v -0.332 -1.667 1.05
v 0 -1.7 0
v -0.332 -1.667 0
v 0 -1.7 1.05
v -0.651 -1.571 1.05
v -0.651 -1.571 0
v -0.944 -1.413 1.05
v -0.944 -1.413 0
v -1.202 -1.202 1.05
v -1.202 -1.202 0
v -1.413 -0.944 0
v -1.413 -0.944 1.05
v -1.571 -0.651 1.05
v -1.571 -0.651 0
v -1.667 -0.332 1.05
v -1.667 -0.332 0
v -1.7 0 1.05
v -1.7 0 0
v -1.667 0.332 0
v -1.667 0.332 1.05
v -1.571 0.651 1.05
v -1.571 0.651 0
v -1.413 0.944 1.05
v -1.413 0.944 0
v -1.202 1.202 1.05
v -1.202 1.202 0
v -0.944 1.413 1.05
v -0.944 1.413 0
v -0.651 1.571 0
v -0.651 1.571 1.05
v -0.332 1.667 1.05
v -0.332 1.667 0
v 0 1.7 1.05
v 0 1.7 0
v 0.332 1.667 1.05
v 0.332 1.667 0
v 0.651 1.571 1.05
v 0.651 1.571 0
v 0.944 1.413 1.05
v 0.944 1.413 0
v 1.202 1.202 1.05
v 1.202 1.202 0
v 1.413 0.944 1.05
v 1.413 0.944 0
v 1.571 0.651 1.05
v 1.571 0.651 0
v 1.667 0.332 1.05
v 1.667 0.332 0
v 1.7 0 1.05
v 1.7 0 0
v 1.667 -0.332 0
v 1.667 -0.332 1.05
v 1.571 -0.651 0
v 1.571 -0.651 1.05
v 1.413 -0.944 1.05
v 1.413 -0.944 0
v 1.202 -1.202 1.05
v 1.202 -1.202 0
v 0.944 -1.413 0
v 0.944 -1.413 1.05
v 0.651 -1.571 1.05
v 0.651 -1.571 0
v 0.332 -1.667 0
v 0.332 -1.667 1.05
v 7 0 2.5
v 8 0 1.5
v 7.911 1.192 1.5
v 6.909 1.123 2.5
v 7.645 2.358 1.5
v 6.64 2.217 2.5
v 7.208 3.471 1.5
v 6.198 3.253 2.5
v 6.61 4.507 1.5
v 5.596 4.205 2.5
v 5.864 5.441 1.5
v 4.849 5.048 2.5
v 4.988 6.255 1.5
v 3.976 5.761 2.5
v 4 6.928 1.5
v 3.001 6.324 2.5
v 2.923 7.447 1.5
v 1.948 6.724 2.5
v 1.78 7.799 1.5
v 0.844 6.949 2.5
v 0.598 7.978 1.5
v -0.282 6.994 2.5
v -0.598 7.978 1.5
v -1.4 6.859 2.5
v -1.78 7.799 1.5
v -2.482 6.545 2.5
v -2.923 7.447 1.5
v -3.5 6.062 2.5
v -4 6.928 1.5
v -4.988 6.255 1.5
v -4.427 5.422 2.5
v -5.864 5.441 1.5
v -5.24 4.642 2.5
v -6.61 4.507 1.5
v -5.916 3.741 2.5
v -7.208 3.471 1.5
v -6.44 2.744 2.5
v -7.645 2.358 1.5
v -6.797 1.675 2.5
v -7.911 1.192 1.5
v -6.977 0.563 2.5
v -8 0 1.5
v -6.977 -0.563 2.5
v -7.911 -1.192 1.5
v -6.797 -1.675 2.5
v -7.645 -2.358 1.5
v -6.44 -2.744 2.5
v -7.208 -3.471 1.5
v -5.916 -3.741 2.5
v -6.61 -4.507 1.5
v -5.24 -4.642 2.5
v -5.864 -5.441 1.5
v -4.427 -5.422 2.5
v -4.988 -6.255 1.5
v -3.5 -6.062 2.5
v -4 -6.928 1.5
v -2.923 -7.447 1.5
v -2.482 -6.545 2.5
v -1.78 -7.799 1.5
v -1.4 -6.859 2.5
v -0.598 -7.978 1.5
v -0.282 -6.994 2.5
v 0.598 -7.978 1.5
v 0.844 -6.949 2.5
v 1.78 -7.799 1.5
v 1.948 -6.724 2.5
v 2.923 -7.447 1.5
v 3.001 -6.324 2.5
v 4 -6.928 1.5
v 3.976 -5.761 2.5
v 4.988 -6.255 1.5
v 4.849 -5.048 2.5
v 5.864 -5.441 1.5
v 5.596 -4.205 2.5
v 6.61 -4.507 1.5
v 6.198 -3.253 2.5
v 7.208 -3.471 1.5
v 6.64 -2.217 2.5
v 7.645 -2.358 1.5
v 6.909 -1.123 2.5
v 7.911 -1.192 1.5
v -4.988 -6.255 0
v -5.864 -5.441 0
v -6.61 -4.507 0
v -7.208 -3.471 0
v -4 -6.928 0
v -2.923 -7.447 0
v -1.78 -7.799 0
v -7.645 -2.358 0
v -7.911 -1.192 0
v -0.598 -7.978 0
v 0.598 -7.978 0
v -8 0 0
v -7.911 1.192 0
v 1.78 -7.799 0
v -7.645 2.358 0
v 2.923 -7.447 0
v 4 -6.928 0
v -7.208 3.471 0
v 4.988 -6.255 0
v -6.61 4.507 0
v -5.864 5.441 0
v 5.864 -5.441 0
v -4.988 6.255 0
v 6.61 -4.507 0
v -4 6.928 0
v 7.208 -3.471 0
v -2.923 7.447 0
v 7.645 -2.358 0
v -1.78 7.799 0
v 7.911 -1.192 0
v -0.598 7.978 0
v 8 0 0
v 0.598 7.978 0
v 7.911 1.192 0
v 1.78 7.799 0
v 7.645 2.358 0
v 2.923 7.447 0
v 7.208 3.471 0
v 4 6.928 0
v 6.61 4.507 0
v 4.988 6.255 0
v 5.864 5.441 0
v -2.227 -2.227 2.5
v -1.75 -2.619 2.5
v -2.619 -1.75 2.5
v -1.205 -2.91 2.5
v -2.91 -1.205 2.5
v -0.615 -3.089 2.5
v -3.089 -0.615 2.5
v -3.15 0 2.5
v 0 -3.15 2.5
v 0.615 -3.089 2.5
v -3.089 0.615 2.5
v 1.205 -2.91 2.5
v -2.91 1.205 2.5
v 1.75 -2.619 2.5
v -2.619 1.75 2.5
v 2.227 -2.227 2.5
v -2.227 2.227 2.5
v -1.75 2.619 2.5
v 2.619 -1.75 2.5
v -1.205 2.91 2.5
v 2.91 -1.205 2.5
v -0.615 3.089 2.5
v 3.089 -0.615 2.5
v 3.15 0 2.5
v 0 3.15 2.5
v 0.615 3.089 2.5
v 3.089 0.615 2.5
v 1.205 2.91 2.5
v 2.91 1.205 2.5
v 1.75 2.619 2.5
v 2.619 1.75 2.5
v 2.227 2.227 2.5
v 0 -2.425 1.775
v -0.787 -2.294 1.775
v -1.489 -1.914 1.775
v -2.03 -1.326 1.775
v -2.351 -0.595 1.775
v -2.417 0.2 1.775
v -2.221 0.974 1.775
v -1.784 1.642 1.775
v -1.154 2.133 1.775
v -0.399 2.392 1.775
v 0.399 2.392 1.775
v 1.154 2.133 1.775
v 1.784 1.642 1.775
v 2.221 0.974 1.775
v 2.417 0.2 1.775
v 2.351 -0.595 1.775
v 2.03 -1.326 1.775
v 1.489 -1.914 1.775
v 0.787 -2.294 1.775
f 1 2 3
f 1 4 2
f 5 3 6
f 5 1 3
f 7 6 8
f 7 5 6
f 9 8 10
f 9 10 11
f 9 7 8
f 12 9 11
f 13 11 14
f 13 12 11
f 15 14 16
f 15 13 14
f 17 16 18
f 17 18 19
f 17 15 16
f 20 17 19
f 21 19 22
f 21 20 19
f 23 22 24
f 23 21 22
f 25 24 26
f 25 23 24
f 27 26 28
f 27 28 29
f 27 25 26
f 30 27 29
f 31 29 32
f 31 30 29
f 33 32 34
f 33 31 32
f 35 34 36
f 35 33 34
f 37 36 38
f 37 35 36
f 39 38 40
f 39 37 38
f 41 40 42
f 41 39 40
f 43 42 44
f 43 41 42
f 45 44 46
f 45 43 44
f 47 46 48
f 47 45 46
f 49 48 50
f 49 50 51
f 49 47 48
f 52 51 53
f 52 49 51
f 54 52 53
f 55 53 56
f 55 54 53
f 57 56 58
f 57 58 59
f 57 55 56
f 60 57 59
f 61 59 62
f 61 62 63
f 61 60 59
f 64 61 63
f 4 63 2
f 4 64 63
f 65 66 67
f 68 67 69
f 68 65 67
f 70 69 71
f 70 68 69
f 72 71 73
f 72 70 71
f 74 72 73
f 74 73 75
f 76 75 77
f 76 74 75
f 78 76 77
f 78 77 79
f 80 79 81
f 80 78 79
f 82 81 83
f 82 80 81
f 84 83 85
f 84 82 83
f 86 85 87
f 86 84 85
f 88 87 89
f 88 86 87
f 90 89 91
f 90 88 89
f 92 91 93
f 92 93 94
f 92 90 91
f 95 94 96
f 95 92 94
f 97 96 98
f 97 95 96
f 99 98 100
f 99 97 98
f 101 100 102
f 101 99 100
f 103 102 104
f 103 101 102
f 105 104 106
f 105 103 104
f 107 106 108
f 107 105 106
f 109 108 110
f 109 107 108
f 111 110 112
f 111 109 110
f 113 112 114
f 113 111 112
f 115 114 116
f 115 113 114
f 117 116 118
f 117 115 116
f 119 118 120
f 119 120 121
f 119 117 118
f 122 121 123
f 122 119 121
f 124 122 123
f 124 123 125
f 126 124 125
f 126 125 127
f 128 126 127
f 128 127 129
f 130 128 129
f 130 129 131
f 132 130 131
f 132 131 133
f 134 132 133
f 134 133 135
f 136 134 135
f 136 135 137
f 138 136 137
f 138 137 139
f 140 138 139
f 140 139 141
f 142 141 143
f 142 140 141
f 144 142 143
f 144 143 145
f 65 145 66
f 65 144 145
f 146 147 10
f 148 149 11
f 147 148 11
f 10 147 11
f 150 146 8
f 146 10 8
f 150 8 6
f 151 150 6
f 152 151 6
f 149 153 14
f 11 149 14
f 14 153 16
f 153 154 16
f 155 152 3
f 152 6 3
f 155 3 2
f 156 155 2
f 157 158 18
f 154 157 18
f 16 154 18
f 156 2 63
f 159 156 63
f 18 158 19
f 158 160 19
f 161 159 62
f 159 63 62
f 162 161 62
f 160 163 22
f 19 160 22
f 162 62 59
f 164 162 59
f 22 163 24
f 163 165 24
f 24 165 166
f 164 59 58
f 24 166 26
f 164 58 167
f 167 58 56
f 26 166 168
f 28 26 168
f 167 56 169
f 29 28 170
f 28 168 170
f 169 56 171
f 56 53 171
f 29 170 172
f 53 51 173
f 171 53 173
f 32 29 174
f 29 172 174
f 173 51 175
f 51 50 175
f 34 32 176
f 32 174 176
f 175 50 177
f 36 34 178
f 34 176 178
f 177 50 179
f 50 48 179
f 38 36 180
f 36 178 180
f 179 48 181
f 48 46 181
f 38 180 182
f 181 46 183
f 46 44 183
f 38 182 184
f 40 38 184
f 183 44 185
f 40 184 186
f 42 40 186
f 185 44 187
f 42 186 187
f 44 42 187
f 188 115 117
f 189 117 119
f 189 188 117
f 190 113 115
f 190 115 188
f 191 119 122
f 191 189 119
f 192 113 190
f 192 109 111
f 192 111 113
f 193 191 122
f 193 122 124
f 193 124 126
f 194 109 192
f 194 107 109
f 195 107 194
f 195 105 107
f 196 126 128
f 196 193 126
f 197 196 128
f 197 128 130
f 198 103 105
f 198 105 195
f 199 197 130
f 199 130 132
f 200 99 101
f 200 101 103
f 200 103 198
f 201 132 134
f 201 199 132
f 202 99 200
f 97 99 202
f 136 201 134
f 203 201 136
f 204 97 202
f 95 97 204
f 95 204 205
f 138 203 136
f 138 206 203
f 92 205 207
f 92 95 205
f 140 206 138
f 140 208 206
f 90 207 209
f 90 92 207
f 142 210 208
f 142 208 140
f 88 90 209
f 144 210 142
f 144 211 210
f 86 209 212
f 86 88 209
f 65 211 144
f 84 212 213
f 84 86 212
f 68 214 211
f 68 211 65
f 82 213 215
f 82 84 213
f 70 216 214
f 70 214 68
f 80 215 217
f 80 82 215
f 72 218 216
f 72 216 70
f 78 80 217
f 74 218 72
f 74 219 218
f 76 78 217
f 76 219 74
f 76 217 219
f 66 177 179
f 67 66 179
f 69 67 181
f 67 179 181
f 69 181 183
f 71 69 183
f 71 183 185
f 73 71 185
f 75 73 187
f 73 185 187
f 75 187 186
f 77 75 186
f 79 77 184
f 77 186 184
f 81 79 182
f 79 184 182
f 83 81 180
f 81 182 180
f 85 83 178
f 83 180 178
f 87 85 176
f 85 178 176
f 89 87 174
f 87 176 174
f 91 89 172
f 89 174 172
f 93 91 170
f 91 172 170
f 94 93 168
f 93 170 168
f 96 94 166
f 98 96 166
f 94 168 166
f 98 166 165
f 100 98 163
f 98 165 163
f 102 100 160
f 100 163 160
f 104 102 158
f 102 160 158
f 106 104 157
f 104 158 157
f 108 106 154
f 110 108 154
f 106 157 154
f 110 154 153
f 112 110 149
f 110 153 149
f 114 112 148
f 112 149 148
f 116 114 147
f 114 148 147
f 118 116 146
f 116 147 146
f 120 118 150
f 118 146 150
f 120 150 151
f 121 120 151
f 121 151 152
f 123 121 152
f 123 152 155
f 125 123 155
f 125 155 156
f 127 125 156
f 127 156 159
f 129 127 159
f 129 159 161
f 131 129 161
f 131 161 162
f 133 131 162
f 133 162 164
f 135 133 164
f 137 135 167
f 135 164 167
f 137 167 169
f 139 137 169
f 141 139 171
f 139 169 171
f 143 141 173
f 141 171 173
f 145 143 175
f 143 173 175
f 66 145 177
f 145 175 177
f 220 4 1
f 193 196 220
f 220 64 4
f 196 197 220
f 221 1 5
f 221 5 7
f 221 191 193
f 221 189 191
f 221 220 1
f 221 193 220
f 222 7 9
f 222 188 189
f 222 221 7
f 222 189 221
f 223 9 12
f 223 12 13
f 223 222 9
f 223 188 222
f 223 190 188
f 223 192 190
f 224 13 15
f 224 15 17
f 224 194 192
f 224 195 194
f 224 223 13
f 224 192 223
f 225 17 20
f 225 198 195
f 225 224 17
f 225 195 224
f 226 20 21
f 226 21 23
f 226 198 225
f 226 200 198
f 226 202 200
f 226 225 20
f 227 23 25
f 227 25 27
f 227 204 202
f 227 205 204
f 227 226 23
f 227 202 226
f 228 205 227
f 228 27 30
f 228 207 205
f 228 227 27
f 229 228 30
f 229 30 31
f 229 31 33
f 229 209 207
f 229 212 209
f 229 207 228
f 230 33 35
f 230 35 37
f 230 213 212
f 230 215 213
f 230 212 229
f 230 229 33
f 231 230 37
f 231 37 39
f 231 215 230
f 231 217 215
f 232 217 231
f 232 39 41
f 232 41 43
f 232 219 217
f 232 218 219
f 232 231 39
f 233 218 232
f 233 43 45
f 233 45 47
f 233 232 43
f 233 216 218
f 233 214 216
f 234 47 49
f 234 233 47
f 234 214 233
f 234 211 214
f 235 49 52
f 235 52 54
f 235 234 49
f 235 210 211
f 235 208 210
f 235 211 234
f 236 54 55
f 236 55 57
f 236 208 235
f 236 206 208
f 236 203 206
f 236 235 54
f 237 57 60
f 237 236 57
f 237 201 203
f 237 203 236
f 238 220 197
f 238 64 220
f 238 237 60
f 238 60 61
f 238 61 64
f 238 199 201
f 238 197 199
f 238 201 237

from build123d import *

# Parameters (mm, degrees)
SKETCH_1_R      = 8
EXTRUDE_1_DEPTH = 2.5
CHAMFER_1_SIZE  = 1


with BuildPart() as part:
    # Эскиз1 → Бобышка-Вытянуть1 (new body)
    with BuildSketch(Plane.XY):
        Circle(SKETCH_1_R)
    extrude(amount=EXTRUDE_1_DEPTH)

    # Фаска1
    chamfer_1_edges = [part.edges().sort_by_distance(p)[0] for p in [
        (-8, 0, 2.5),
    ]]
    chamfer(chamfer_1_edges, length=CHAMFER_1_SIZE)

    # Эскиз4 → Зенковка для винта с полупотайной головкой M31 (revolve, cut)
    with BuildSketch(Plane(origin=(0, 0, 2.5), x_dir=(0, -1, 0), z_dir=(1, 0, 0))):
        Polygon((0, 0), (0, 2.5), (1.7, 2.5), (1.7, 1.45), (3.15, 0), align=None)
    revolve(axis=Axis((0, 0, 8.85), (0, 0, -1)), mode=Mode.SUBTRACT)


solid = part.part
